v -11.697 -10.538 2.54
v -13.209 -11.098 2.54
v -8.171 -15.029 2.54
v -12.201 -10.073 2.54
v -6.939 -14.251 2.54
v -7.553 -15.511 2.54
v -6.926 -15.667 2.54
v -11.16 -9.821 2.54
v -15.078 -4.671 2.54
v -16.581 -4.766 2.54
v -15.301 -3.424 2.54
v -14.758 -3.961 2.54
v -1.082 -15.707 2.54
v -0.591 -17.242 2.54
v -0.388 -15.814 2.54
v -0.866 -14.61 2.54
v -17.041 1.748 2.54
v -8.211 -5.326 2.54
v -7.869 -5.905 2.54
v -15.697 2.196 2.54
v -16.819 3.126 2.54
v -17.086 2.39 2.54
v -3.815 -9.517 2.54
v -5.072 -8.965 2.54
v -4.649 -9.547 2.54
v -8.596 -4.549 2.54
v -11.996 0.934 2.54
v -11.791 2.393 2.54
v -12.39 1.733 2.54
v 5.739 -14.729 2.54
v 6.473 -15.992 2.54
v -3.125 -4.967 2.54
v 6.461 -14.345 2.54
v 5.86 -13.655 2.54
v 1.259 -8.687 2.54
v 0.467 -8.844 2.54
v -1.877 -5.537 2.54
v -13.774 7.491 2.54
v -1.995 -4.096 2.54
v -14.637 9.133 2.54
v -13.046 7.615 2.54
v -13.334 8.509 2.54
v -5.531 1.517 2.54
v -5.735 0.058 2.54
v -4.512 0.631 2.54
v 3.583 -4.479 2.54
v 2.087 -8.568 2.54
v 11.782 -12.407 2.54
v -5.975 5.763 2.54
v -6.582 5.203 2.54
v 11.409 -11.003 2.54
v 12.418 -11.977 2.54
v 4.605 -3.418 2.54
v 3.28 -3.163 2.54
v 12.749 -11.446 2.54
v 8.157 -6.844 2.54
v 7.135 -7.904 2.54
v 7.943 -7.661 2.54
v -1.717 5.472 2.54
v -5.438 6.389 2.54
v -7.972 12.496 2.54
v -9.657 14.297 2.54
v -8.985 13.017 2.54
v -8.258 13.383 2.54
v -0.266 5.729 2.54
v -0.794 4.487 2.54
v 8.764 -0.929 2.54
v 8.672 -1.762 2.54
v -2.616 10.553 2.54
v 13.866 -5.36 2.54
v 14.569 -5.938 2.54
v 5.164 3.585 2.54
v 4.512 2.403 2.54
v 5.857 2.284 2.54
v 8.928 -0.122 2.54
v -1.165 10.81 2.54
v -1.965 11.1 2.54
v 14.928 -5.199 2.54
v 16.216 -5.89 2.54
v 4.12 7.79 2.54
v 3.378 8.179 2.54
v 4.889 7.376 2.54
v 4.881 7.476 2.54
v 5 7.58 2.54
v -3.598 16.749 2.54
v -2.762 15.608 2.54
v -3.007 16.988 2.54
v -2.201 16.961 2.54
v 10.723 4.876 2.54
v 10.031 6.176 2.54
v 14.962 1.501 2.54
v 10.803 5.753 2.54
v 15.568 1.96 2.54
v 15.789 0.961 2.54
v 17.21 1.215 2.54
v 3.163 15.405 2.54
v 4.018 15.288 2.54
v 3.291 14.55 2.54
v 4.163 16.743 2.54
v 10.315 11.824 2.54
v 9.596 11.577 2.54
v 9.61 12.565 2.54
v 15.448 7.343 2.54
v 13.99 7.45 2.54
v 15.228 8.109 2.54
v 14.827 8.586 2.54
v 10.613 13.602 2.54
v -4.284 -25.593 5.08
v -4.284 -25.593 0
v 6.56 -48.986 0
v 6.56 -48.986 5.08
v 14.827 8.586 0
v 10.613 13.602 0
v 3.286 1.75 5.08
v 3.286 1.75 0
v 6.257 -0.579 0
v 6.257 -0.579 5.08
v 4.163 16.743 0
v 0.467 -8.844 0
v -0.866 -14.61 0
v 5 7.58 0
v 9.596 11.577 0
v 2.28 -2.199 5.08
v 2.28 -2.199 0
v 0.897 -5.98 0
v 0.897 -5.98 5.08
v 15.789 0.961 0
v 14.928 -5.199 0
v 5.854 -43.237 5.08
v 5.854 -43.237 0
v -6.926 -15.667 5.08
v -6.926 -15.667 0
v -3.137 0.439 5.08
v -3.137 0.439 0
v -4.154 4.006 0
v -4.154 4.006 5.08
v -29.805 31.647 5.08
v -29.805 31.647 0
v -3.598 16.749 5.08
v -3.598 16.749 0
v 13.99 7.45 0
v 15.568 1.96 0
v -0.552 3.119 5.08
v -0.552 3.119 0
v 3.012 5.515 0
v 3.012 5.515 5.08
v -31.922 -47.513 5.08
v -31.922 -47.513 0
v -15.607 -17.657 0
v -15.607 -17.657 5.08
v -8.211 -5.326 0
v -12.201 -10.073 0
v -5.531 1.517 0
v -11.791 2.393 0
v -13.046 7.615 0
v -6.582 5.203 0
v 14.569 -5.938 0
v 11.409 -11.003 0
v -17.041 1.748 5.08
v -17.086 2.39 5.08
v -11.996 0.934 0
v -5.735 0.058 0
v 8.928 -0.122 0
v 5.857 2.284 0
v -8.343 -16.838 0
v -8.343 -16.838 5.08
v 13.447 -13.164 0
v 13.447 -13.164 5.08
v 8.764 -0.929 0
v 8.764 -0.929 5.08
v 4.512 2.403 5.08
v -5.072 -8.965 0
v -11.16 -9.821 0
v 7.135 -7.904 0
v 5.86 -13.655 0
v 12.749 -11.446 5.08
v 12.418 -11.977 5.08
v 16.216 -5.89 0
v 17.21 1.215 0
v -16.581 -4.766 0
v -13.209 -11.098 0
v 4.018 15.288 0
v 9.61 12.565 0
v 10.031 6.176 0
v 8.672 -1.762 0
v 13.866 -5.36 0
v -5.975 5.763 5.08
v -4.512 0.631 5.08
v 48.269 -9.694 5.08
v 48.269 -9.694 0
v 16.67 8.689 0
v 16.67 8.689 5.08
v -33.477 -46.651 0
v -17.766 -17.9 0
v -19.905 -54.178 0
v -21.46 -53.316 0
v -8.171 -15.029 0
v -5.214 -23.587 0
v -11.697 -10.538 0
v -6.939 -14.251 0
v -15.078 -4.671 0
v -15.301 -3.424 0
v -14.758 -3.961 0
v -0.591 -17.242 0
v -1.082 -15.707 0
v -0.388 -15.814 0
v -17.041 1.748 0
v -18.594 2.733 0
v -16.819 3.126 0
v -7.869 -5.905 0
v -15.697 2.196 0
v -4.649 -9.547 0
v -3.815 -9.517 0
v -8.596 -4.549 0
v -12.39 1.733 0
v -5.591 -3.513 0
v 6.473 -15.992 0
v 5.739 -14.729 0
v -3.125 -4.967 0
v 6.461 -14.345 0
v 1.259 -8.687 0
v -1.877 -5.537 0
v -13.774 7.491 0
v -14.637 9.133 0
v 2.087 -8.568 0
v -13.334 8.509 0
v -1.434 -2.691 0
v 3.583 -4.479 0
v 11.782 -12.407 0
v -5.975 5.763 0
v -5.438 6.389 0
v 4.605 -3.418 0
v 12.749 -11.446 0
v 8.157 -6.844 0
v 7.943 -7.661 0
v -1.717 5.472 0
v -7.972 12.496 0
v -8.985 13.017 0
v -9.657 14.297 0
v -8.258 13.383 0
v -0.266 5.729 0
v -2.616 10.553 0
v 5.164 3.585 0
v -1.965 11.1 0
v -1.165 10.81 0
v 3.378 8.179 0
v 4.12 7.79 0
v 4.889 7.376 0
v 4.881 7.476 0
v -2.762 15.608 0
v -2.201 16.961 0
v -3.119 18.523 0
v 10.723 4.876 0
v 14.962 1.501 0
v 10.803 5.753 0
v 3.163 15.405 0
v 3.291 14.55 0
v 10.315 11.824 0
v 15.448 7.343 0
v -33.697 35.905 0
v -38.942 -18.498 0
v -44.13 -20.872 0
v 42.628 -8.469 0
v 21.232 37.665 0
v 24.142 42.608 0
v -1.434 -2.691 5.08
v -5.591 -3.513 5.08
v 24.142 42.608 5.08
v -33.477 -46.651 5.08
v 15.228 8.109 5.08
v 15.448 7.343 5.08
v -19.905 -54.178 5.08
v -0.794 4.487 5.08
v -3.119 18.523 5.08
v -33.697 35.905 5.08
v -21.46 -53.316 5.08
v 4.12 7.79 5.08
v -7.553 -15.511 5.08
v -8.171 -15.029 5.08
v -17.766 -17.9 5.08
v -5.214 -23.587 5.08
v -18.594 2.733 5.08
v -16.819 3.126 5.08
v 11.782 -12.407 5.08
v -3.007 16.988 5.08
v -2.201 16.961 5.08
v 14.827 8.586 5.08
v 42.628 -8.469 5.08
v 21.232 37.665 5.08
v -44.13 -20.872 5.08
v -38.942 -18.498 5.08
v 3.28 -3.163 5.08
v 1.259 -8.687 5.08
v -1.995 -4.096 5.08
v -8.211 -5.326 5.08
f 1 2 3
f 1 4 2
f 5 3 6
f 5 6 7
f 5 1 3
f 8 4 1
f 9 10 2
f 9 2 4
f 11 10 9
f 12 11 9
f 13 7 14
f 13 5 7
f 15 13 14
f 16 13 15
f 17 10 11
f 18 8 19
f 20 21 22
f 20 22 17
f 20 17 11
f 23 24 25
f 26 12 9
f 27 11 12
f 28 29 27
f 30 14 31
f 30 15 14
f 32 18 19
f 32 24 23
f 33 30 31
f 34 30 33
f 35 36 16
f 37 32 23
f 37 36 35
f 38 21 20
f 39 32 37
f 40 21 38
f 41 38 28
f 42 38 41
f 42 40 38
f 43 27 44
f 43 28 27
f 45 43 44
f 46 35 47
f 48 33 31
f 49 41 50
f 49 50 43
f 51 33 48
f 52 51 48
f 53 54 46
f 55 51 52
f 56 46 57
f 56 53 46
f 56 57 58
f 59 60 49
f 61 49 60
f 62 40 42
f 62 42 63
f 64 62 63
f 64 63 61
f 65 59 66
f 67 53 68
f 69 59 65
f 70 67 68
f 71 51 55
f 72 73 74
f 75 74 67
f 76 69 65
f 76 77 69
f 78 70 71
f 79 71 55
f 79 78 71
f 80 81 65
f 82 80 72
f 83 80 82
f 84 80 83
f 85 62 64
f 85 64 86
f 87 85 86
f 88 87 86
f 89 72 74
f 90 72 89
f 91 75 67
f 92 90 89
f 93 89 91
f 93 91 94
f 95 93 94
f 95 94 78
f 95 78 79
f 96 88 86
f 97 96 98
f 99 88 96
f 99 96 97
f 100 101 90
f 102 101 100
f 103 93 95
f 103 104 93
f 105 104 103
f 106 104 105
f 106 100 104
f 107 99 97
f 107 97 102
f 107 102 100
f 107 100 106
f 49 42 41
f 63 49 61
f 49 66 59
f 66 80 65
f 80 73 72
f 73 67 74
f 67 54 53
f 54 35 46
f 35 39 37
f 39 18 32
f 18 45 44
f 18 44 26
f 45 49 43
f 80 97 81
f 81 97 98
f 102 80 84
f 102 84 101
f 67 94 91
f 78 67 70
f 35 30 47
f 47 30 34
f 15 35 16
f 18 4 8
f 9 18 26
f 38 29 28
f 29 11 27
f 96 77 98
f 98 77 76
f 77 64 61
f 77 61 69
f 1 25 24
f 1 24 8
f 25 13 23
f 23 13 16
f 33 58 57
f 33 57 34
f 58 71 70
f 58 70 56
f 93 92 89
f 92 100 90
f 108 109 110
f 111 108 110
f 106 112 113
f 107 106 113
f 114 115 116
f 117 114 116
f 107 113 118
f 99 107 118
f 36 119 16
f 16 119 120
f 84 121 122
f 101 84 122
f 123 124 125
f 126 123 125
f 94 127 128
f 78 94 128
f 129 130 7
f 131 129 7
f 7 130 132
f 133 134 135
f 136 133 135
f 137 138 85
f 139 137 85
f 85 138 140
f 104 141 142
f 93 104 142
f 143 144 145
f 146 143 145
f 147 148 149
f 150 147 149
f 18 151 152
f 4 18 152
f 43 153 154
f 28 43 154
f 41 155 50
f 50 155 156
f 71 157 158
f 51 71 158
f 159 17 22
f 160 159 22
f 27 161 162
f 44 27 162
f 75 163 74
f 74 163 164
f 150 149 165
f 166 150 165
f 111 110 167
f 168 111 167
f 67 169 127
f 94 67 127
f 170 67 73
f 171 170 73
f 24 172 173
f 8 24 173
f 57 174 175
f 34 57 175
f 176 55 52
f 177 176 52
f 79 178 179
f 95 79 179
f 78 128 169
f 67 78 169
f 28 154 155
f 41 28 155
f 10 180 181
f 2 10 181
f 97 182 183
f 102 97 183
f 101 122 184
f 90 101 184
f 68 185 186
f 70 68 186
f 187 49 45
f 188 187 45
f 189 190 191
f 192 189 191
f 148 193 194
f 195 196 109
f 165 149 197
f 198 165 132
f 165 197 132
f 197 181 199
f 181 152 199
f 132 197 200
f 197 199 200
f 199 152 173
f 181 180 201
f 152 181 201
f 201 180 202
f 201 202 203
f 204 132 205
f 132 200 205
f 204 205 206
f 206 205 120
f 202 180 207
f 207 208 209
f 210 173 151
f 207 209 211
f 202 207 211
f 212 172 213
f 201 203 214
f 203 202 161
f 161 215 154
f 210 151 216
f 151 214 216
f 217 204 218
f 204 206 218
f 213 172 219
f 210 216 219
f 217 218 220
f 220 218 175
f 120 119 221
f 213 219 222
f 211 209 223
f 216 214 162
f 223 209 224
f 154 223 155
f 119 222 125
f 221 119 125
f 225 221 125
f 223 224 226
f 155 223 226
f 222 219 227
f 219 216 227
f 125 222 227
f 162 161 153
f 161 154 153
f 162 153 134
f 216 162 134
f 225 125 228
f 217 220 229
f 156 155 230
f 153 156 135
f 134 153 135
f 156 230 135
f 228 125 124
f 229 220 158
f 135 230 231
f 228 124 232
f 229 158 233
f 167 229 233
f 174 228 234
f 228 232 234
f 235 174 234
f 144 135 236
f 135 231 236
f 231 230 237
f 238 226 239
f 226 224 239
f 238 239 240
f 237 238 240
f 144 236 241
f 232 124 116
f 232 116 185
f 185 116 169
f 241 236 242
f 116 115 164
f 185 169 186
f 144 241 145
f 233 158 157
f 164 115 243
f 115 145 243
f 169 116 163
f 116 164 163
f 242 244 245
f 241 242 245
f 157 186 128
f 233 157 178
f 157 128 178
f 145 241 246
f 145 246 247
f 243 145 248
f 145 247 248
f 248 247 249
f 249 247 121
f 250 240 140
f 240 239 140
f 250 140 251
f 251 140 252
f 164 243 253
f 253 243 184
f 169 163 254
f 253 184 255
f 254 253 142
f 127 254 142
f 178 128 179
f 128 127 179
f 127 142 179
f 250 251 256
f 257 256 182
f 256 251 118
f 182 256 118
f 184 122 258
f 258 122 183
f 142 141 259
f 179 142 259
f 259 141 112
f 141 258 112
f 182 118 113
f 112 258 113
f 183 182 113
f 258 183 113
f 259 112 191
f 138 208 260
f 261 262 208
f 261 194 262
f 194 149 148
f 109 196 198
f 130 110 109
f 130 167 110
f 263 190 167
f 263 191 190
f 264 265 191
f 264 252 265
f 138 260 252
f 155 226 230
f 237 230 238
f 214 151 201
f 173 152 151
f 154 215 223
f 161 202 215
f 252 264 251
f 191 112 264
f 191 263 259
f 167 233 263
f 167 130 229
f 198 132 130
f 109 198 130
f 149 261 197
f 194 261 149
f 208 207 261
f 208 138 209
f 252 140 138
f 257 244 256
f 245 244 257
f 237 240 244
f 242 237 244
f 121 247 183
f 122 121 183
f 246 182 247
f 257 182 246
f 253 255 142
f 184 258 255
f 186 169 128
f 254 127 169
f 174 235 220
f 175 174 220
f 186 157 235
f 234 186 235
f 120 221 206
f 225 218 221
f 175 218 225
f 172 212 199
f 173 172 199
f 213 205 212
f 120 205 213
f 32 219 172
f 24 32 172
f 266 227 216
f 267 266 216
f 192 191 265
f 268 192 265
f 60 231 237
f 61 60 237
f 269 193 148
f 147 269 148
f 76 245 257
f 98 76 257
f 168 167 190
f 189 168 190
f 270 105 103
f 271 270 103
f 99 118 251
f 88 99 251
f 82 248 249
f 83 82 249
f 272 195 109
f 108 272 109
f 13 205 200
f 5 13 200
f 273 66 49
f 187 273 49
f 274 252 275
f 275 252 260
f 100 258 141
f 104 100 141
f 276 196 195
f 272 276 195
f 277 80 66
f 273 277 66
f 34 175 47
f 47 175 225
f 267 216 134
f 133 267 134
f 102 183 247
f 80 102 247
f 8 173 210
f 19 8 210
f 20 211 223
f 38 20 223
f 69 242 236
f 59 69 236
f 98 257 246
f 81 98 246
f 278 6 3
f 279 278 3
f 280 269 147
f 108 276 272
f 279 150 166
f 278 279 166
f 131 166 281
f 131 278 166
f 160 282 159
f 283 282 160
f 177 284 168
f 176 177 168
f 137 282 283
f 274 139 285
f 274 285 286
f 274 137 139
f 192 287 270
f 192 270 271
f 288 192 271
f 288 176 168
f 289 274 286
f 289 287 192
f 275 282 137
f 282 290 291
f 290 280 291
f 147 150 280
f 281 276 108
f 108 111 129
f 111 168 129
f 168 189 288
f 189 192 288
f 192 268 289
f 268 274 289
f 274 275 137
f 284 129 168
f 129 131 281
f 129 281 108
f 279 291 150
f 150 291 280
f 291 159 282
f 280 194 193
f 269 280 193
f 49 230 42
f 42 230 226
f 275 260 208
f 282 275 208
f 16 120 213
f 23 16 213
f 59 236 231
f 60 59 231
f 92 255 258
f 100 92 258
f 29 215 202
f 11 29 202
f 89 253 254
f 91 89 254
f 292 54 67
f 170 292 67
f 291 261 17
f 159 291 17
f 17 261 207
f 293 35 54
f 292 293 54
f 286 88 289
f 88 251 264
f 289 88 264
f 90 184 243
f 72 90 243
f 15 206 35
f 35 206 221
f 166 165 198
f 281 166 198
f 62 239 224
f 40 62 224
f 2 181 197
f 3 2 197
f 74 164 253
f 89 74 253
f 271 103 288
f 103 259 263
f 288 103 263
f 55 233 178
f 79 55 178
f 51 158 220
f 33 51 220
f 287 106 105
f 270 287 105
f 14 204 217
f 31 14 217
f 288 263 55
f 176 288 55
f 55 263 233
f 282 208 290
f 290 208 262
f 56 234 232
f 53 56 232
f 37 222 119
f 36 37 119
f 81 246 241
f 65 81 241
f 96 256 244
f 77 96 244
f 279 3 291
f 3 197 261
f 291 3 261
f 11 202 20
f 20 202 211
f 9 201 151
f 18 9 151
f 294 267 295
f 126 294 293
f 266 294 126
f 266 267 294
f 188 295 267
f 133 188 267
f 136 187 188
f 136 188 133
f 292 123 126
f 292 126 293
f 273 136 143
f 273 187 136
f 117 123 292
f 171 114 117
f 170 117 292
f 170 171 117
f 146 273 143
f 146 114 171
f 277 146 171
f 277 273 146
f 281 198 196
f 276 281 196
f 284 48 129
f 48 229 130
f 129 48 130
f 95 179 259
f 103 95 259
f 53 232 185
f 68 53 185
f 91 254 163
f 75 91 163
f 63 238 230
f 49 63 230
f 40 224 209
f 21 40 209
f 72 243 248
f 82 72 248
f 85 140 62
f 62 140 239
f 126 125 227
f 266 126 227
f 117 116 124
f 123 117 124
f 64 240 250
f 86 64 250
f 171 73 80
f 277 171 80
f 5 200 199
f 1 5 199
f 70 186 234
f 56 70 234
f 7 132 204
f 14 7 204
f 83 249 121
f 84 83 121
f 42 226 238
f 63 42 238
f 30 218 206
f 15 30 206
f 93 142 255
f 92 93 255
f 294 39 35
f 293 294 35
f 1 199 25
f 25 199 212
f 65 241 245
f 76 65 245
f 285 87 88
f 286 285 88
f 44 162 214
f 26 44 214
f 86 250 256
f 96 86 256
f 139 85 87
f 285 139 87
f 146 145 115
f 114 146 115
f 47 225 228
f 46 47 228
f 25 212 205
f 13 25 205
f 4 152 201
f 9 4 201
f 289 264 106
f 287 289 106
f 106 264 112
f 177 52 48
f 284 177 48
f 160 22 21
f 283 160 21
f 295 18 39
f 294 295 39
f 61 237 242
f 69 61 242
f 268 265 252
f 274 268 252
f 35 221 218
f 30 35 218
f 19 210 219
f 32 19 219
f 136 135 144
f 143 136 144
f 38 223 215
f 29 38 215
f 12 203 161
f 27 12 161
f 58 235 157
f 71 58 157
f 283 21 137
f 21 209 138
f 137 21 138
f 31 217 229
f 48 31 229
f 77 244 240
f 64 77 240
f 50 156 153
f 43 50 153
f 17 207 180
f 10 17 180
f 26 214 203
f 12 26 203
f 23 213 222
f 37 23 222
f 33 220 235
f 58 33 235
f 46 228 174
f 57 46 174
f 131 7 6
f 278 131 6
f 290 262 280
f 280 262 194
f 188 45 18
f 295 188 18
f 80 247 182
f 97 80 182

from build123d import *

# Parameters (mm, degrees)
F1_DEPTH = 2.54
F2_DEPTH = 5.08
F3_DEPTH = 2.54


with BuildPart() as f1:
    # F0 (on Top) → F1 (new body)
    with BuildSketch(Plane.XY):
        Polygon((4.1629817264, 16.7427408623), (-2.2013881197, 16.9608854028), (-3.0068131679, 16.9884920758), (-3.5975513827, 16.7493756287), (-9.6567027493, 14.2967786738), (-14.636860697, 9.1330223569), (-16.819031361, 3.1255211535), (-17.0861724585, 2.3900835037), (-17.0408391317, 1.7477325928), (-16.5811297789, -4.7661225006), (-13.2090591257, -11.0982226257), (-8.1707658783, -15.0293453717), (-7.5530221491, -15.5113392346), (-6.9259689778, -15.6672522309), (-0.5909990259, -17.2424043737), (6.4732131979, -15.9921011543), (11.7815616344, -12.4065981462), (12.4181480525, -11.9766183616), (12.7489744416, -11.4464258818), (16.2158722935, -5.8902694501), (17.2097248984, 1.2145605608), (15.4482409163, 7.3426855737), (15.2278597229, 8.1093820168), (14.8271287482, 8.5863303821), (10.6129592606, 13.6020176507), align=None)
        Polygon((-8.87183017, 13.1347723613), (-8.2580116546, 13.3832311521), (-2.762426935, 15.6077100491), (3.1628166018, 15.4046169605), (3.8246250129, 15.3819328779), (4.0175995312, 15.2879667291), (9.6097206141, 12.5649643009), (9.7503645505, 12.4964797716), (10.3154122974, 11.8239622569), (13.990177478, 7.4502717858), (15.5683023366, 1.9600450691), (15.8109616228, 1.1158441247), (15.7892903314, 0.9609209091), (14.9276215775, -5.1989563128), (14.8978868649, -5.4115231227), (14.5693523604, -5.9380425585), (11.4088321251, -11.0031888601), (6.461372617, -14.3449308653), (5.9470866648, -14.6923032827), (5.7392984293, -14.7290799665), (-0.3884161265, -15.8136313636), (-0.5429641074, -15.8409849923), (-1.0821087258, -15.7069299285), (-6.9391314528, -14.250616486), (-11.6974519194, -10.5379421932), (-12.1354599299, -10.1961869264), (-12.2011743525, -10.0727878799), (-15.0780164622, -4.6706317106), (-15.233457138, -4.3787440178), (-15.300853021, -3.4237775529), (-15.6974512153, 2.1958235111), (-13.774064022, 7.4908955551), (-13.4472133706, 8.3907132065), (-13.3335565047, 8.5085601433), (-8.9854870359, 13.0169254245), align=None, mode=Mode.SUBTRACT)
    extrude(amount=F1_DEPTH)

    # F0 (on Top) → F2 (join)
    with BuildSketch(Plane.XY):
        Polygon((-33.6969470542, 35.9051802405), (-18.5940397475, 2.7332442428), (-44.1299353493, -20.8721632227), (-17.7662312147, -17.9002710145), (-15.6070743083, -17.6568764765), (-8.3429911406, -16.8380206717), (-5.2143965318, -23.5869952705), (-4.2844619667, -25.5930412891), (6.5595177125, -48.9855713404), (13.446561196, -13.1637173716), (48.2686344411, -9.6937073203), (16.6703053103, 8.6887283333), (24.1416345765, 42.6079515874), (-3.119114862, 18.5226071992), align=None)
        Polygon((-3.0068131679, 16.9884920758), (-2.2013881197, 16.9608854028), (21.2322100997, 37.6648753881), (14.8271287482, 8.5863303821), (15.2278597229, 8.1093820168), (15.4482409163, 7.3426855737), (42.6276437938, -8.4690246731), (12.7489744416, -11.4464258818), (12.4181480525, -11.9766183616), (11.7815616344, -12.4065981462), (5.8542420156, -43.2366020978), (-6.9259689778, -15.6672522309), (-7.5530221491, -15.5113392346), (-8.1707658783, -15.0293453717), (-38.9424450696, -18.498133868), (-17.0408391317, 1.7477325928), (-17.0861724585, 2.3900835037), (-16.819031361, 3.1255211535), (-29.8048108816, 31.6474102437), (-3.5975513827, 16.7493756287), align=None, mode=Mode.SUBTRACT)
        Polygon((-15.6070743083, -17.6568764765), (-17.7662312147, -17.9002710145), (-33.477195848, -46.6509044953), (-31.9222960033, -47.5132837729), align=None)
        Polygon((-4.2844619667, -25.5930412891), (-5.2143965318, -23.5869952705), (-21.4599514133, -53.315914213), (-19.9050526355, -54.1782928989), align=None)
    extrude(amount=F2_DEPTH)



with BuildPart() as f2:
    # F0 (on Top) → F2, piece 2 (new body)
    with BuildSketch(Plane.XY):
        Polygon((4.1200000644, 7.7903017796), (-0.7940794801, 4.4865484492), (-5.9754360801, 5.7629782777), (-4.5123451925, 0.6312052529), (-8.2113317605, -5.3255283132), (-1.9947032178, -4.096442149), (1.2593087084, -8.6874249228), (3.2795508064, -3.1629457339), (8.763532132, -0.9293583373), (4.5119235723, 2.4027612904), align=None)
        Polygon((-4.1539905478, 4.0062945987), (-0.5520264313, 3.1189489102), (3.0121522283, 5.5151590265), (3.2860576248, 1.749943662), (6.2573989827, -0.578790209), (2.2798709363, -2.1988096778), (0.897081895, -5.9801333565), (-1.4341748227, -2.6910367967), (-5.5907486439, -3.5128306902), (-3.1368822337, 0.4387998832), align=None, mode=Mode.SUBTRACT)
    extrude(amount=F2_DEPTH)


with BuildPart() as f1_1:
    add(f1.part)

    add(f2.part)  # F3 merges F2
    # F0 (on Top) → F3 (join)
    with BuildSketch(Plane.XY):
        Polygon((-4.5123451925, 0.6312052529), (-5.9754360801, 5.7629782777), (-13.3335565047, 8.5085601433), (-13.4472133706, 8.3907132065), (-13.774064022, 7.4908955551), (-12.3904388558, 1.7332251319), align=None)
        Polygon((-11.7914695166, 2.3932106743), (-13.0463627003, 7.6151895343), (-6.5817369362, 5.2030029646), (-5.5309745762, 1.5174671034), align=None, mode=Mode.SUBTRACT)
        Polygon((-8.2113317605, -5.3255283132), (-4.5123451925, 0.6312052529), (-12.3904388558, 1.7332251319), (-15.300853021, -3.4237775529), (-15.233457138, -4.3787440178), (-15.0780164622, -4.6706317106), align=None)
        Polygon((-14.7583322732, -3.961178532), (-11.9955596687, 0.9342160512), (-5.7350646244, 0.0584724657), (-8.5961228333, -4.5488871865), align=None, mode=Mode.SUBTRACT)
        Polygon((-0.7940794801, 4.4865484492), (-1.964637715, 11.1002015721), (-8.2580116546, 13.3832311521), (-8.87183017, 13.1347723613), (-8.9854870359, 13.0169254245), (-5.9754360801, 5.7629782777), align=None)
        Polygon((-5.4377678462, 6.3891455642), (-7.9717519008, 12.4958150767), (-2.6158103292, 10.5528552027), (-1.7166215483, 5.4724392849), align=None, mode=Mode.SUBTRACT)
        Polygon((3.1628166018, 15.4046169605), (-1.964637715, 11.1002015721), (-0.7940794801, 4.4865484492), (4.1200000644, 7.7903017796), (4.0175995312, 15.2879667291), (3.8246250129, 15.3819328779), align=None)
        Polygon((-0.2659681626, 5.7291925355), (-1.1651568481, 10.8096079145), (3.2910031409, 14.5504825172), (3.3780218404, 8.1790601046), align=None, mode=Mode.SUBTRACT)
        Polygon((9.6097206141, 12.5649643009), (4.1200000644, 7.7903017796), (4.5119235723, 2.4027612904), (10.8034854124, 5.7532438515), (10.3154122974, 11.8239622569), (9.7503645505, 12.4964797716), align=None)
        Polygon((4.8887121728, 7.3756327333), (4.881389673, 7.4762908036), (5.0001721085, 7.5796013524), (9.5962864589, 11.577053451), (10.0305084156, 6.1761429256), (5.1644805282, 3.5848083742), align=None, mode=Mode.SUBTRACT)
        Polygon((10.8034854124, 5.7532438515), (4.5119235723, 2.4027612904), (8.763532132, -0.9293583373), (15.7892903314, 0.9609209091), (15.8109616228, 1.1158441247), (15.5683023366, 1.9600450691), align=None)
        Polygon((5.8569437001, 2.2844957212), (10.7229715874, 4.8758302725), (14.9620662315, 1.5011510565), (8.9279294384, -0.1223325912), align=None, mode=Mode.SUBTRACT)
        Polygon((14.9276215775, -5.1989563128), (8.763532132, -0.9293583373), (3.2795508064, -3.1629457339), (7.9430756148, -7.6606580026), (14.5693523604, -5.9380425585), (14.8978868649, -5.4115231227), align=None)
        Polygon((8.1572798635, -6.8438879856), (4.6053955772, -3.418291642), (8.6719909478, -1.7619956724), (13.8661536119, -5.3597673452), align=None, mode=Mode.SUBTRACT)
        Polygon((7.9430756148, -7.6606580026), (3.2795508064, -3.1629457339), (1.2593087084, -8.6874249228), (5.7392984293, -14.7290799665), (5.9470866648, -14.6923032827), (6.461372617, -14.3449308653), align=None)
        Polygon((2.0874466636, -8.5675672358), (3.5827076434, -4.4786819617), (7.1345919298, -7.9042783053), (5.859837335, -13.654963535), align=None, mode=Mode.SUBTRACT)
        Polygon((1.2593087084, -8.6874249228), (-1.9947032178, -4.096442149), (-4.6486377456, -9.5467212497), (-1.0821087258, -15.7069299285), (-0.5429641074, -15.8409849923), (-0.3884161265, -15.8136313636), align=None)
        Polygon((-0.8661165856, -14.6098730783), (-3.8147970804, -9.5168296532), (-1.8767315973, -5.5367021526), (0.4671585391, -8.8436228043), align=None, mode=Mode.SUBTRACT)
        Polygon((-1.9947032178, -4.096442149), (-8.2113317605, -5.3255283132), (-12.2011743525, -10.0727878799), (-12.1354599299, -10.1961869264), (-11.6974519194, -10.5379421932), (-4.6486377456, -9.5467212497), align=None)
        Polygon((-11.1601935886, -9.8211437548), (-7.8689757469, -5.9051332795), (-3.1249878704, -4.9672020806), (-5.0716364955, -8.9649564363), align=None, mode=Mode.SUBTRACT)
    extrude(amount=F3_DEPTH)


solid = f1_1.part
